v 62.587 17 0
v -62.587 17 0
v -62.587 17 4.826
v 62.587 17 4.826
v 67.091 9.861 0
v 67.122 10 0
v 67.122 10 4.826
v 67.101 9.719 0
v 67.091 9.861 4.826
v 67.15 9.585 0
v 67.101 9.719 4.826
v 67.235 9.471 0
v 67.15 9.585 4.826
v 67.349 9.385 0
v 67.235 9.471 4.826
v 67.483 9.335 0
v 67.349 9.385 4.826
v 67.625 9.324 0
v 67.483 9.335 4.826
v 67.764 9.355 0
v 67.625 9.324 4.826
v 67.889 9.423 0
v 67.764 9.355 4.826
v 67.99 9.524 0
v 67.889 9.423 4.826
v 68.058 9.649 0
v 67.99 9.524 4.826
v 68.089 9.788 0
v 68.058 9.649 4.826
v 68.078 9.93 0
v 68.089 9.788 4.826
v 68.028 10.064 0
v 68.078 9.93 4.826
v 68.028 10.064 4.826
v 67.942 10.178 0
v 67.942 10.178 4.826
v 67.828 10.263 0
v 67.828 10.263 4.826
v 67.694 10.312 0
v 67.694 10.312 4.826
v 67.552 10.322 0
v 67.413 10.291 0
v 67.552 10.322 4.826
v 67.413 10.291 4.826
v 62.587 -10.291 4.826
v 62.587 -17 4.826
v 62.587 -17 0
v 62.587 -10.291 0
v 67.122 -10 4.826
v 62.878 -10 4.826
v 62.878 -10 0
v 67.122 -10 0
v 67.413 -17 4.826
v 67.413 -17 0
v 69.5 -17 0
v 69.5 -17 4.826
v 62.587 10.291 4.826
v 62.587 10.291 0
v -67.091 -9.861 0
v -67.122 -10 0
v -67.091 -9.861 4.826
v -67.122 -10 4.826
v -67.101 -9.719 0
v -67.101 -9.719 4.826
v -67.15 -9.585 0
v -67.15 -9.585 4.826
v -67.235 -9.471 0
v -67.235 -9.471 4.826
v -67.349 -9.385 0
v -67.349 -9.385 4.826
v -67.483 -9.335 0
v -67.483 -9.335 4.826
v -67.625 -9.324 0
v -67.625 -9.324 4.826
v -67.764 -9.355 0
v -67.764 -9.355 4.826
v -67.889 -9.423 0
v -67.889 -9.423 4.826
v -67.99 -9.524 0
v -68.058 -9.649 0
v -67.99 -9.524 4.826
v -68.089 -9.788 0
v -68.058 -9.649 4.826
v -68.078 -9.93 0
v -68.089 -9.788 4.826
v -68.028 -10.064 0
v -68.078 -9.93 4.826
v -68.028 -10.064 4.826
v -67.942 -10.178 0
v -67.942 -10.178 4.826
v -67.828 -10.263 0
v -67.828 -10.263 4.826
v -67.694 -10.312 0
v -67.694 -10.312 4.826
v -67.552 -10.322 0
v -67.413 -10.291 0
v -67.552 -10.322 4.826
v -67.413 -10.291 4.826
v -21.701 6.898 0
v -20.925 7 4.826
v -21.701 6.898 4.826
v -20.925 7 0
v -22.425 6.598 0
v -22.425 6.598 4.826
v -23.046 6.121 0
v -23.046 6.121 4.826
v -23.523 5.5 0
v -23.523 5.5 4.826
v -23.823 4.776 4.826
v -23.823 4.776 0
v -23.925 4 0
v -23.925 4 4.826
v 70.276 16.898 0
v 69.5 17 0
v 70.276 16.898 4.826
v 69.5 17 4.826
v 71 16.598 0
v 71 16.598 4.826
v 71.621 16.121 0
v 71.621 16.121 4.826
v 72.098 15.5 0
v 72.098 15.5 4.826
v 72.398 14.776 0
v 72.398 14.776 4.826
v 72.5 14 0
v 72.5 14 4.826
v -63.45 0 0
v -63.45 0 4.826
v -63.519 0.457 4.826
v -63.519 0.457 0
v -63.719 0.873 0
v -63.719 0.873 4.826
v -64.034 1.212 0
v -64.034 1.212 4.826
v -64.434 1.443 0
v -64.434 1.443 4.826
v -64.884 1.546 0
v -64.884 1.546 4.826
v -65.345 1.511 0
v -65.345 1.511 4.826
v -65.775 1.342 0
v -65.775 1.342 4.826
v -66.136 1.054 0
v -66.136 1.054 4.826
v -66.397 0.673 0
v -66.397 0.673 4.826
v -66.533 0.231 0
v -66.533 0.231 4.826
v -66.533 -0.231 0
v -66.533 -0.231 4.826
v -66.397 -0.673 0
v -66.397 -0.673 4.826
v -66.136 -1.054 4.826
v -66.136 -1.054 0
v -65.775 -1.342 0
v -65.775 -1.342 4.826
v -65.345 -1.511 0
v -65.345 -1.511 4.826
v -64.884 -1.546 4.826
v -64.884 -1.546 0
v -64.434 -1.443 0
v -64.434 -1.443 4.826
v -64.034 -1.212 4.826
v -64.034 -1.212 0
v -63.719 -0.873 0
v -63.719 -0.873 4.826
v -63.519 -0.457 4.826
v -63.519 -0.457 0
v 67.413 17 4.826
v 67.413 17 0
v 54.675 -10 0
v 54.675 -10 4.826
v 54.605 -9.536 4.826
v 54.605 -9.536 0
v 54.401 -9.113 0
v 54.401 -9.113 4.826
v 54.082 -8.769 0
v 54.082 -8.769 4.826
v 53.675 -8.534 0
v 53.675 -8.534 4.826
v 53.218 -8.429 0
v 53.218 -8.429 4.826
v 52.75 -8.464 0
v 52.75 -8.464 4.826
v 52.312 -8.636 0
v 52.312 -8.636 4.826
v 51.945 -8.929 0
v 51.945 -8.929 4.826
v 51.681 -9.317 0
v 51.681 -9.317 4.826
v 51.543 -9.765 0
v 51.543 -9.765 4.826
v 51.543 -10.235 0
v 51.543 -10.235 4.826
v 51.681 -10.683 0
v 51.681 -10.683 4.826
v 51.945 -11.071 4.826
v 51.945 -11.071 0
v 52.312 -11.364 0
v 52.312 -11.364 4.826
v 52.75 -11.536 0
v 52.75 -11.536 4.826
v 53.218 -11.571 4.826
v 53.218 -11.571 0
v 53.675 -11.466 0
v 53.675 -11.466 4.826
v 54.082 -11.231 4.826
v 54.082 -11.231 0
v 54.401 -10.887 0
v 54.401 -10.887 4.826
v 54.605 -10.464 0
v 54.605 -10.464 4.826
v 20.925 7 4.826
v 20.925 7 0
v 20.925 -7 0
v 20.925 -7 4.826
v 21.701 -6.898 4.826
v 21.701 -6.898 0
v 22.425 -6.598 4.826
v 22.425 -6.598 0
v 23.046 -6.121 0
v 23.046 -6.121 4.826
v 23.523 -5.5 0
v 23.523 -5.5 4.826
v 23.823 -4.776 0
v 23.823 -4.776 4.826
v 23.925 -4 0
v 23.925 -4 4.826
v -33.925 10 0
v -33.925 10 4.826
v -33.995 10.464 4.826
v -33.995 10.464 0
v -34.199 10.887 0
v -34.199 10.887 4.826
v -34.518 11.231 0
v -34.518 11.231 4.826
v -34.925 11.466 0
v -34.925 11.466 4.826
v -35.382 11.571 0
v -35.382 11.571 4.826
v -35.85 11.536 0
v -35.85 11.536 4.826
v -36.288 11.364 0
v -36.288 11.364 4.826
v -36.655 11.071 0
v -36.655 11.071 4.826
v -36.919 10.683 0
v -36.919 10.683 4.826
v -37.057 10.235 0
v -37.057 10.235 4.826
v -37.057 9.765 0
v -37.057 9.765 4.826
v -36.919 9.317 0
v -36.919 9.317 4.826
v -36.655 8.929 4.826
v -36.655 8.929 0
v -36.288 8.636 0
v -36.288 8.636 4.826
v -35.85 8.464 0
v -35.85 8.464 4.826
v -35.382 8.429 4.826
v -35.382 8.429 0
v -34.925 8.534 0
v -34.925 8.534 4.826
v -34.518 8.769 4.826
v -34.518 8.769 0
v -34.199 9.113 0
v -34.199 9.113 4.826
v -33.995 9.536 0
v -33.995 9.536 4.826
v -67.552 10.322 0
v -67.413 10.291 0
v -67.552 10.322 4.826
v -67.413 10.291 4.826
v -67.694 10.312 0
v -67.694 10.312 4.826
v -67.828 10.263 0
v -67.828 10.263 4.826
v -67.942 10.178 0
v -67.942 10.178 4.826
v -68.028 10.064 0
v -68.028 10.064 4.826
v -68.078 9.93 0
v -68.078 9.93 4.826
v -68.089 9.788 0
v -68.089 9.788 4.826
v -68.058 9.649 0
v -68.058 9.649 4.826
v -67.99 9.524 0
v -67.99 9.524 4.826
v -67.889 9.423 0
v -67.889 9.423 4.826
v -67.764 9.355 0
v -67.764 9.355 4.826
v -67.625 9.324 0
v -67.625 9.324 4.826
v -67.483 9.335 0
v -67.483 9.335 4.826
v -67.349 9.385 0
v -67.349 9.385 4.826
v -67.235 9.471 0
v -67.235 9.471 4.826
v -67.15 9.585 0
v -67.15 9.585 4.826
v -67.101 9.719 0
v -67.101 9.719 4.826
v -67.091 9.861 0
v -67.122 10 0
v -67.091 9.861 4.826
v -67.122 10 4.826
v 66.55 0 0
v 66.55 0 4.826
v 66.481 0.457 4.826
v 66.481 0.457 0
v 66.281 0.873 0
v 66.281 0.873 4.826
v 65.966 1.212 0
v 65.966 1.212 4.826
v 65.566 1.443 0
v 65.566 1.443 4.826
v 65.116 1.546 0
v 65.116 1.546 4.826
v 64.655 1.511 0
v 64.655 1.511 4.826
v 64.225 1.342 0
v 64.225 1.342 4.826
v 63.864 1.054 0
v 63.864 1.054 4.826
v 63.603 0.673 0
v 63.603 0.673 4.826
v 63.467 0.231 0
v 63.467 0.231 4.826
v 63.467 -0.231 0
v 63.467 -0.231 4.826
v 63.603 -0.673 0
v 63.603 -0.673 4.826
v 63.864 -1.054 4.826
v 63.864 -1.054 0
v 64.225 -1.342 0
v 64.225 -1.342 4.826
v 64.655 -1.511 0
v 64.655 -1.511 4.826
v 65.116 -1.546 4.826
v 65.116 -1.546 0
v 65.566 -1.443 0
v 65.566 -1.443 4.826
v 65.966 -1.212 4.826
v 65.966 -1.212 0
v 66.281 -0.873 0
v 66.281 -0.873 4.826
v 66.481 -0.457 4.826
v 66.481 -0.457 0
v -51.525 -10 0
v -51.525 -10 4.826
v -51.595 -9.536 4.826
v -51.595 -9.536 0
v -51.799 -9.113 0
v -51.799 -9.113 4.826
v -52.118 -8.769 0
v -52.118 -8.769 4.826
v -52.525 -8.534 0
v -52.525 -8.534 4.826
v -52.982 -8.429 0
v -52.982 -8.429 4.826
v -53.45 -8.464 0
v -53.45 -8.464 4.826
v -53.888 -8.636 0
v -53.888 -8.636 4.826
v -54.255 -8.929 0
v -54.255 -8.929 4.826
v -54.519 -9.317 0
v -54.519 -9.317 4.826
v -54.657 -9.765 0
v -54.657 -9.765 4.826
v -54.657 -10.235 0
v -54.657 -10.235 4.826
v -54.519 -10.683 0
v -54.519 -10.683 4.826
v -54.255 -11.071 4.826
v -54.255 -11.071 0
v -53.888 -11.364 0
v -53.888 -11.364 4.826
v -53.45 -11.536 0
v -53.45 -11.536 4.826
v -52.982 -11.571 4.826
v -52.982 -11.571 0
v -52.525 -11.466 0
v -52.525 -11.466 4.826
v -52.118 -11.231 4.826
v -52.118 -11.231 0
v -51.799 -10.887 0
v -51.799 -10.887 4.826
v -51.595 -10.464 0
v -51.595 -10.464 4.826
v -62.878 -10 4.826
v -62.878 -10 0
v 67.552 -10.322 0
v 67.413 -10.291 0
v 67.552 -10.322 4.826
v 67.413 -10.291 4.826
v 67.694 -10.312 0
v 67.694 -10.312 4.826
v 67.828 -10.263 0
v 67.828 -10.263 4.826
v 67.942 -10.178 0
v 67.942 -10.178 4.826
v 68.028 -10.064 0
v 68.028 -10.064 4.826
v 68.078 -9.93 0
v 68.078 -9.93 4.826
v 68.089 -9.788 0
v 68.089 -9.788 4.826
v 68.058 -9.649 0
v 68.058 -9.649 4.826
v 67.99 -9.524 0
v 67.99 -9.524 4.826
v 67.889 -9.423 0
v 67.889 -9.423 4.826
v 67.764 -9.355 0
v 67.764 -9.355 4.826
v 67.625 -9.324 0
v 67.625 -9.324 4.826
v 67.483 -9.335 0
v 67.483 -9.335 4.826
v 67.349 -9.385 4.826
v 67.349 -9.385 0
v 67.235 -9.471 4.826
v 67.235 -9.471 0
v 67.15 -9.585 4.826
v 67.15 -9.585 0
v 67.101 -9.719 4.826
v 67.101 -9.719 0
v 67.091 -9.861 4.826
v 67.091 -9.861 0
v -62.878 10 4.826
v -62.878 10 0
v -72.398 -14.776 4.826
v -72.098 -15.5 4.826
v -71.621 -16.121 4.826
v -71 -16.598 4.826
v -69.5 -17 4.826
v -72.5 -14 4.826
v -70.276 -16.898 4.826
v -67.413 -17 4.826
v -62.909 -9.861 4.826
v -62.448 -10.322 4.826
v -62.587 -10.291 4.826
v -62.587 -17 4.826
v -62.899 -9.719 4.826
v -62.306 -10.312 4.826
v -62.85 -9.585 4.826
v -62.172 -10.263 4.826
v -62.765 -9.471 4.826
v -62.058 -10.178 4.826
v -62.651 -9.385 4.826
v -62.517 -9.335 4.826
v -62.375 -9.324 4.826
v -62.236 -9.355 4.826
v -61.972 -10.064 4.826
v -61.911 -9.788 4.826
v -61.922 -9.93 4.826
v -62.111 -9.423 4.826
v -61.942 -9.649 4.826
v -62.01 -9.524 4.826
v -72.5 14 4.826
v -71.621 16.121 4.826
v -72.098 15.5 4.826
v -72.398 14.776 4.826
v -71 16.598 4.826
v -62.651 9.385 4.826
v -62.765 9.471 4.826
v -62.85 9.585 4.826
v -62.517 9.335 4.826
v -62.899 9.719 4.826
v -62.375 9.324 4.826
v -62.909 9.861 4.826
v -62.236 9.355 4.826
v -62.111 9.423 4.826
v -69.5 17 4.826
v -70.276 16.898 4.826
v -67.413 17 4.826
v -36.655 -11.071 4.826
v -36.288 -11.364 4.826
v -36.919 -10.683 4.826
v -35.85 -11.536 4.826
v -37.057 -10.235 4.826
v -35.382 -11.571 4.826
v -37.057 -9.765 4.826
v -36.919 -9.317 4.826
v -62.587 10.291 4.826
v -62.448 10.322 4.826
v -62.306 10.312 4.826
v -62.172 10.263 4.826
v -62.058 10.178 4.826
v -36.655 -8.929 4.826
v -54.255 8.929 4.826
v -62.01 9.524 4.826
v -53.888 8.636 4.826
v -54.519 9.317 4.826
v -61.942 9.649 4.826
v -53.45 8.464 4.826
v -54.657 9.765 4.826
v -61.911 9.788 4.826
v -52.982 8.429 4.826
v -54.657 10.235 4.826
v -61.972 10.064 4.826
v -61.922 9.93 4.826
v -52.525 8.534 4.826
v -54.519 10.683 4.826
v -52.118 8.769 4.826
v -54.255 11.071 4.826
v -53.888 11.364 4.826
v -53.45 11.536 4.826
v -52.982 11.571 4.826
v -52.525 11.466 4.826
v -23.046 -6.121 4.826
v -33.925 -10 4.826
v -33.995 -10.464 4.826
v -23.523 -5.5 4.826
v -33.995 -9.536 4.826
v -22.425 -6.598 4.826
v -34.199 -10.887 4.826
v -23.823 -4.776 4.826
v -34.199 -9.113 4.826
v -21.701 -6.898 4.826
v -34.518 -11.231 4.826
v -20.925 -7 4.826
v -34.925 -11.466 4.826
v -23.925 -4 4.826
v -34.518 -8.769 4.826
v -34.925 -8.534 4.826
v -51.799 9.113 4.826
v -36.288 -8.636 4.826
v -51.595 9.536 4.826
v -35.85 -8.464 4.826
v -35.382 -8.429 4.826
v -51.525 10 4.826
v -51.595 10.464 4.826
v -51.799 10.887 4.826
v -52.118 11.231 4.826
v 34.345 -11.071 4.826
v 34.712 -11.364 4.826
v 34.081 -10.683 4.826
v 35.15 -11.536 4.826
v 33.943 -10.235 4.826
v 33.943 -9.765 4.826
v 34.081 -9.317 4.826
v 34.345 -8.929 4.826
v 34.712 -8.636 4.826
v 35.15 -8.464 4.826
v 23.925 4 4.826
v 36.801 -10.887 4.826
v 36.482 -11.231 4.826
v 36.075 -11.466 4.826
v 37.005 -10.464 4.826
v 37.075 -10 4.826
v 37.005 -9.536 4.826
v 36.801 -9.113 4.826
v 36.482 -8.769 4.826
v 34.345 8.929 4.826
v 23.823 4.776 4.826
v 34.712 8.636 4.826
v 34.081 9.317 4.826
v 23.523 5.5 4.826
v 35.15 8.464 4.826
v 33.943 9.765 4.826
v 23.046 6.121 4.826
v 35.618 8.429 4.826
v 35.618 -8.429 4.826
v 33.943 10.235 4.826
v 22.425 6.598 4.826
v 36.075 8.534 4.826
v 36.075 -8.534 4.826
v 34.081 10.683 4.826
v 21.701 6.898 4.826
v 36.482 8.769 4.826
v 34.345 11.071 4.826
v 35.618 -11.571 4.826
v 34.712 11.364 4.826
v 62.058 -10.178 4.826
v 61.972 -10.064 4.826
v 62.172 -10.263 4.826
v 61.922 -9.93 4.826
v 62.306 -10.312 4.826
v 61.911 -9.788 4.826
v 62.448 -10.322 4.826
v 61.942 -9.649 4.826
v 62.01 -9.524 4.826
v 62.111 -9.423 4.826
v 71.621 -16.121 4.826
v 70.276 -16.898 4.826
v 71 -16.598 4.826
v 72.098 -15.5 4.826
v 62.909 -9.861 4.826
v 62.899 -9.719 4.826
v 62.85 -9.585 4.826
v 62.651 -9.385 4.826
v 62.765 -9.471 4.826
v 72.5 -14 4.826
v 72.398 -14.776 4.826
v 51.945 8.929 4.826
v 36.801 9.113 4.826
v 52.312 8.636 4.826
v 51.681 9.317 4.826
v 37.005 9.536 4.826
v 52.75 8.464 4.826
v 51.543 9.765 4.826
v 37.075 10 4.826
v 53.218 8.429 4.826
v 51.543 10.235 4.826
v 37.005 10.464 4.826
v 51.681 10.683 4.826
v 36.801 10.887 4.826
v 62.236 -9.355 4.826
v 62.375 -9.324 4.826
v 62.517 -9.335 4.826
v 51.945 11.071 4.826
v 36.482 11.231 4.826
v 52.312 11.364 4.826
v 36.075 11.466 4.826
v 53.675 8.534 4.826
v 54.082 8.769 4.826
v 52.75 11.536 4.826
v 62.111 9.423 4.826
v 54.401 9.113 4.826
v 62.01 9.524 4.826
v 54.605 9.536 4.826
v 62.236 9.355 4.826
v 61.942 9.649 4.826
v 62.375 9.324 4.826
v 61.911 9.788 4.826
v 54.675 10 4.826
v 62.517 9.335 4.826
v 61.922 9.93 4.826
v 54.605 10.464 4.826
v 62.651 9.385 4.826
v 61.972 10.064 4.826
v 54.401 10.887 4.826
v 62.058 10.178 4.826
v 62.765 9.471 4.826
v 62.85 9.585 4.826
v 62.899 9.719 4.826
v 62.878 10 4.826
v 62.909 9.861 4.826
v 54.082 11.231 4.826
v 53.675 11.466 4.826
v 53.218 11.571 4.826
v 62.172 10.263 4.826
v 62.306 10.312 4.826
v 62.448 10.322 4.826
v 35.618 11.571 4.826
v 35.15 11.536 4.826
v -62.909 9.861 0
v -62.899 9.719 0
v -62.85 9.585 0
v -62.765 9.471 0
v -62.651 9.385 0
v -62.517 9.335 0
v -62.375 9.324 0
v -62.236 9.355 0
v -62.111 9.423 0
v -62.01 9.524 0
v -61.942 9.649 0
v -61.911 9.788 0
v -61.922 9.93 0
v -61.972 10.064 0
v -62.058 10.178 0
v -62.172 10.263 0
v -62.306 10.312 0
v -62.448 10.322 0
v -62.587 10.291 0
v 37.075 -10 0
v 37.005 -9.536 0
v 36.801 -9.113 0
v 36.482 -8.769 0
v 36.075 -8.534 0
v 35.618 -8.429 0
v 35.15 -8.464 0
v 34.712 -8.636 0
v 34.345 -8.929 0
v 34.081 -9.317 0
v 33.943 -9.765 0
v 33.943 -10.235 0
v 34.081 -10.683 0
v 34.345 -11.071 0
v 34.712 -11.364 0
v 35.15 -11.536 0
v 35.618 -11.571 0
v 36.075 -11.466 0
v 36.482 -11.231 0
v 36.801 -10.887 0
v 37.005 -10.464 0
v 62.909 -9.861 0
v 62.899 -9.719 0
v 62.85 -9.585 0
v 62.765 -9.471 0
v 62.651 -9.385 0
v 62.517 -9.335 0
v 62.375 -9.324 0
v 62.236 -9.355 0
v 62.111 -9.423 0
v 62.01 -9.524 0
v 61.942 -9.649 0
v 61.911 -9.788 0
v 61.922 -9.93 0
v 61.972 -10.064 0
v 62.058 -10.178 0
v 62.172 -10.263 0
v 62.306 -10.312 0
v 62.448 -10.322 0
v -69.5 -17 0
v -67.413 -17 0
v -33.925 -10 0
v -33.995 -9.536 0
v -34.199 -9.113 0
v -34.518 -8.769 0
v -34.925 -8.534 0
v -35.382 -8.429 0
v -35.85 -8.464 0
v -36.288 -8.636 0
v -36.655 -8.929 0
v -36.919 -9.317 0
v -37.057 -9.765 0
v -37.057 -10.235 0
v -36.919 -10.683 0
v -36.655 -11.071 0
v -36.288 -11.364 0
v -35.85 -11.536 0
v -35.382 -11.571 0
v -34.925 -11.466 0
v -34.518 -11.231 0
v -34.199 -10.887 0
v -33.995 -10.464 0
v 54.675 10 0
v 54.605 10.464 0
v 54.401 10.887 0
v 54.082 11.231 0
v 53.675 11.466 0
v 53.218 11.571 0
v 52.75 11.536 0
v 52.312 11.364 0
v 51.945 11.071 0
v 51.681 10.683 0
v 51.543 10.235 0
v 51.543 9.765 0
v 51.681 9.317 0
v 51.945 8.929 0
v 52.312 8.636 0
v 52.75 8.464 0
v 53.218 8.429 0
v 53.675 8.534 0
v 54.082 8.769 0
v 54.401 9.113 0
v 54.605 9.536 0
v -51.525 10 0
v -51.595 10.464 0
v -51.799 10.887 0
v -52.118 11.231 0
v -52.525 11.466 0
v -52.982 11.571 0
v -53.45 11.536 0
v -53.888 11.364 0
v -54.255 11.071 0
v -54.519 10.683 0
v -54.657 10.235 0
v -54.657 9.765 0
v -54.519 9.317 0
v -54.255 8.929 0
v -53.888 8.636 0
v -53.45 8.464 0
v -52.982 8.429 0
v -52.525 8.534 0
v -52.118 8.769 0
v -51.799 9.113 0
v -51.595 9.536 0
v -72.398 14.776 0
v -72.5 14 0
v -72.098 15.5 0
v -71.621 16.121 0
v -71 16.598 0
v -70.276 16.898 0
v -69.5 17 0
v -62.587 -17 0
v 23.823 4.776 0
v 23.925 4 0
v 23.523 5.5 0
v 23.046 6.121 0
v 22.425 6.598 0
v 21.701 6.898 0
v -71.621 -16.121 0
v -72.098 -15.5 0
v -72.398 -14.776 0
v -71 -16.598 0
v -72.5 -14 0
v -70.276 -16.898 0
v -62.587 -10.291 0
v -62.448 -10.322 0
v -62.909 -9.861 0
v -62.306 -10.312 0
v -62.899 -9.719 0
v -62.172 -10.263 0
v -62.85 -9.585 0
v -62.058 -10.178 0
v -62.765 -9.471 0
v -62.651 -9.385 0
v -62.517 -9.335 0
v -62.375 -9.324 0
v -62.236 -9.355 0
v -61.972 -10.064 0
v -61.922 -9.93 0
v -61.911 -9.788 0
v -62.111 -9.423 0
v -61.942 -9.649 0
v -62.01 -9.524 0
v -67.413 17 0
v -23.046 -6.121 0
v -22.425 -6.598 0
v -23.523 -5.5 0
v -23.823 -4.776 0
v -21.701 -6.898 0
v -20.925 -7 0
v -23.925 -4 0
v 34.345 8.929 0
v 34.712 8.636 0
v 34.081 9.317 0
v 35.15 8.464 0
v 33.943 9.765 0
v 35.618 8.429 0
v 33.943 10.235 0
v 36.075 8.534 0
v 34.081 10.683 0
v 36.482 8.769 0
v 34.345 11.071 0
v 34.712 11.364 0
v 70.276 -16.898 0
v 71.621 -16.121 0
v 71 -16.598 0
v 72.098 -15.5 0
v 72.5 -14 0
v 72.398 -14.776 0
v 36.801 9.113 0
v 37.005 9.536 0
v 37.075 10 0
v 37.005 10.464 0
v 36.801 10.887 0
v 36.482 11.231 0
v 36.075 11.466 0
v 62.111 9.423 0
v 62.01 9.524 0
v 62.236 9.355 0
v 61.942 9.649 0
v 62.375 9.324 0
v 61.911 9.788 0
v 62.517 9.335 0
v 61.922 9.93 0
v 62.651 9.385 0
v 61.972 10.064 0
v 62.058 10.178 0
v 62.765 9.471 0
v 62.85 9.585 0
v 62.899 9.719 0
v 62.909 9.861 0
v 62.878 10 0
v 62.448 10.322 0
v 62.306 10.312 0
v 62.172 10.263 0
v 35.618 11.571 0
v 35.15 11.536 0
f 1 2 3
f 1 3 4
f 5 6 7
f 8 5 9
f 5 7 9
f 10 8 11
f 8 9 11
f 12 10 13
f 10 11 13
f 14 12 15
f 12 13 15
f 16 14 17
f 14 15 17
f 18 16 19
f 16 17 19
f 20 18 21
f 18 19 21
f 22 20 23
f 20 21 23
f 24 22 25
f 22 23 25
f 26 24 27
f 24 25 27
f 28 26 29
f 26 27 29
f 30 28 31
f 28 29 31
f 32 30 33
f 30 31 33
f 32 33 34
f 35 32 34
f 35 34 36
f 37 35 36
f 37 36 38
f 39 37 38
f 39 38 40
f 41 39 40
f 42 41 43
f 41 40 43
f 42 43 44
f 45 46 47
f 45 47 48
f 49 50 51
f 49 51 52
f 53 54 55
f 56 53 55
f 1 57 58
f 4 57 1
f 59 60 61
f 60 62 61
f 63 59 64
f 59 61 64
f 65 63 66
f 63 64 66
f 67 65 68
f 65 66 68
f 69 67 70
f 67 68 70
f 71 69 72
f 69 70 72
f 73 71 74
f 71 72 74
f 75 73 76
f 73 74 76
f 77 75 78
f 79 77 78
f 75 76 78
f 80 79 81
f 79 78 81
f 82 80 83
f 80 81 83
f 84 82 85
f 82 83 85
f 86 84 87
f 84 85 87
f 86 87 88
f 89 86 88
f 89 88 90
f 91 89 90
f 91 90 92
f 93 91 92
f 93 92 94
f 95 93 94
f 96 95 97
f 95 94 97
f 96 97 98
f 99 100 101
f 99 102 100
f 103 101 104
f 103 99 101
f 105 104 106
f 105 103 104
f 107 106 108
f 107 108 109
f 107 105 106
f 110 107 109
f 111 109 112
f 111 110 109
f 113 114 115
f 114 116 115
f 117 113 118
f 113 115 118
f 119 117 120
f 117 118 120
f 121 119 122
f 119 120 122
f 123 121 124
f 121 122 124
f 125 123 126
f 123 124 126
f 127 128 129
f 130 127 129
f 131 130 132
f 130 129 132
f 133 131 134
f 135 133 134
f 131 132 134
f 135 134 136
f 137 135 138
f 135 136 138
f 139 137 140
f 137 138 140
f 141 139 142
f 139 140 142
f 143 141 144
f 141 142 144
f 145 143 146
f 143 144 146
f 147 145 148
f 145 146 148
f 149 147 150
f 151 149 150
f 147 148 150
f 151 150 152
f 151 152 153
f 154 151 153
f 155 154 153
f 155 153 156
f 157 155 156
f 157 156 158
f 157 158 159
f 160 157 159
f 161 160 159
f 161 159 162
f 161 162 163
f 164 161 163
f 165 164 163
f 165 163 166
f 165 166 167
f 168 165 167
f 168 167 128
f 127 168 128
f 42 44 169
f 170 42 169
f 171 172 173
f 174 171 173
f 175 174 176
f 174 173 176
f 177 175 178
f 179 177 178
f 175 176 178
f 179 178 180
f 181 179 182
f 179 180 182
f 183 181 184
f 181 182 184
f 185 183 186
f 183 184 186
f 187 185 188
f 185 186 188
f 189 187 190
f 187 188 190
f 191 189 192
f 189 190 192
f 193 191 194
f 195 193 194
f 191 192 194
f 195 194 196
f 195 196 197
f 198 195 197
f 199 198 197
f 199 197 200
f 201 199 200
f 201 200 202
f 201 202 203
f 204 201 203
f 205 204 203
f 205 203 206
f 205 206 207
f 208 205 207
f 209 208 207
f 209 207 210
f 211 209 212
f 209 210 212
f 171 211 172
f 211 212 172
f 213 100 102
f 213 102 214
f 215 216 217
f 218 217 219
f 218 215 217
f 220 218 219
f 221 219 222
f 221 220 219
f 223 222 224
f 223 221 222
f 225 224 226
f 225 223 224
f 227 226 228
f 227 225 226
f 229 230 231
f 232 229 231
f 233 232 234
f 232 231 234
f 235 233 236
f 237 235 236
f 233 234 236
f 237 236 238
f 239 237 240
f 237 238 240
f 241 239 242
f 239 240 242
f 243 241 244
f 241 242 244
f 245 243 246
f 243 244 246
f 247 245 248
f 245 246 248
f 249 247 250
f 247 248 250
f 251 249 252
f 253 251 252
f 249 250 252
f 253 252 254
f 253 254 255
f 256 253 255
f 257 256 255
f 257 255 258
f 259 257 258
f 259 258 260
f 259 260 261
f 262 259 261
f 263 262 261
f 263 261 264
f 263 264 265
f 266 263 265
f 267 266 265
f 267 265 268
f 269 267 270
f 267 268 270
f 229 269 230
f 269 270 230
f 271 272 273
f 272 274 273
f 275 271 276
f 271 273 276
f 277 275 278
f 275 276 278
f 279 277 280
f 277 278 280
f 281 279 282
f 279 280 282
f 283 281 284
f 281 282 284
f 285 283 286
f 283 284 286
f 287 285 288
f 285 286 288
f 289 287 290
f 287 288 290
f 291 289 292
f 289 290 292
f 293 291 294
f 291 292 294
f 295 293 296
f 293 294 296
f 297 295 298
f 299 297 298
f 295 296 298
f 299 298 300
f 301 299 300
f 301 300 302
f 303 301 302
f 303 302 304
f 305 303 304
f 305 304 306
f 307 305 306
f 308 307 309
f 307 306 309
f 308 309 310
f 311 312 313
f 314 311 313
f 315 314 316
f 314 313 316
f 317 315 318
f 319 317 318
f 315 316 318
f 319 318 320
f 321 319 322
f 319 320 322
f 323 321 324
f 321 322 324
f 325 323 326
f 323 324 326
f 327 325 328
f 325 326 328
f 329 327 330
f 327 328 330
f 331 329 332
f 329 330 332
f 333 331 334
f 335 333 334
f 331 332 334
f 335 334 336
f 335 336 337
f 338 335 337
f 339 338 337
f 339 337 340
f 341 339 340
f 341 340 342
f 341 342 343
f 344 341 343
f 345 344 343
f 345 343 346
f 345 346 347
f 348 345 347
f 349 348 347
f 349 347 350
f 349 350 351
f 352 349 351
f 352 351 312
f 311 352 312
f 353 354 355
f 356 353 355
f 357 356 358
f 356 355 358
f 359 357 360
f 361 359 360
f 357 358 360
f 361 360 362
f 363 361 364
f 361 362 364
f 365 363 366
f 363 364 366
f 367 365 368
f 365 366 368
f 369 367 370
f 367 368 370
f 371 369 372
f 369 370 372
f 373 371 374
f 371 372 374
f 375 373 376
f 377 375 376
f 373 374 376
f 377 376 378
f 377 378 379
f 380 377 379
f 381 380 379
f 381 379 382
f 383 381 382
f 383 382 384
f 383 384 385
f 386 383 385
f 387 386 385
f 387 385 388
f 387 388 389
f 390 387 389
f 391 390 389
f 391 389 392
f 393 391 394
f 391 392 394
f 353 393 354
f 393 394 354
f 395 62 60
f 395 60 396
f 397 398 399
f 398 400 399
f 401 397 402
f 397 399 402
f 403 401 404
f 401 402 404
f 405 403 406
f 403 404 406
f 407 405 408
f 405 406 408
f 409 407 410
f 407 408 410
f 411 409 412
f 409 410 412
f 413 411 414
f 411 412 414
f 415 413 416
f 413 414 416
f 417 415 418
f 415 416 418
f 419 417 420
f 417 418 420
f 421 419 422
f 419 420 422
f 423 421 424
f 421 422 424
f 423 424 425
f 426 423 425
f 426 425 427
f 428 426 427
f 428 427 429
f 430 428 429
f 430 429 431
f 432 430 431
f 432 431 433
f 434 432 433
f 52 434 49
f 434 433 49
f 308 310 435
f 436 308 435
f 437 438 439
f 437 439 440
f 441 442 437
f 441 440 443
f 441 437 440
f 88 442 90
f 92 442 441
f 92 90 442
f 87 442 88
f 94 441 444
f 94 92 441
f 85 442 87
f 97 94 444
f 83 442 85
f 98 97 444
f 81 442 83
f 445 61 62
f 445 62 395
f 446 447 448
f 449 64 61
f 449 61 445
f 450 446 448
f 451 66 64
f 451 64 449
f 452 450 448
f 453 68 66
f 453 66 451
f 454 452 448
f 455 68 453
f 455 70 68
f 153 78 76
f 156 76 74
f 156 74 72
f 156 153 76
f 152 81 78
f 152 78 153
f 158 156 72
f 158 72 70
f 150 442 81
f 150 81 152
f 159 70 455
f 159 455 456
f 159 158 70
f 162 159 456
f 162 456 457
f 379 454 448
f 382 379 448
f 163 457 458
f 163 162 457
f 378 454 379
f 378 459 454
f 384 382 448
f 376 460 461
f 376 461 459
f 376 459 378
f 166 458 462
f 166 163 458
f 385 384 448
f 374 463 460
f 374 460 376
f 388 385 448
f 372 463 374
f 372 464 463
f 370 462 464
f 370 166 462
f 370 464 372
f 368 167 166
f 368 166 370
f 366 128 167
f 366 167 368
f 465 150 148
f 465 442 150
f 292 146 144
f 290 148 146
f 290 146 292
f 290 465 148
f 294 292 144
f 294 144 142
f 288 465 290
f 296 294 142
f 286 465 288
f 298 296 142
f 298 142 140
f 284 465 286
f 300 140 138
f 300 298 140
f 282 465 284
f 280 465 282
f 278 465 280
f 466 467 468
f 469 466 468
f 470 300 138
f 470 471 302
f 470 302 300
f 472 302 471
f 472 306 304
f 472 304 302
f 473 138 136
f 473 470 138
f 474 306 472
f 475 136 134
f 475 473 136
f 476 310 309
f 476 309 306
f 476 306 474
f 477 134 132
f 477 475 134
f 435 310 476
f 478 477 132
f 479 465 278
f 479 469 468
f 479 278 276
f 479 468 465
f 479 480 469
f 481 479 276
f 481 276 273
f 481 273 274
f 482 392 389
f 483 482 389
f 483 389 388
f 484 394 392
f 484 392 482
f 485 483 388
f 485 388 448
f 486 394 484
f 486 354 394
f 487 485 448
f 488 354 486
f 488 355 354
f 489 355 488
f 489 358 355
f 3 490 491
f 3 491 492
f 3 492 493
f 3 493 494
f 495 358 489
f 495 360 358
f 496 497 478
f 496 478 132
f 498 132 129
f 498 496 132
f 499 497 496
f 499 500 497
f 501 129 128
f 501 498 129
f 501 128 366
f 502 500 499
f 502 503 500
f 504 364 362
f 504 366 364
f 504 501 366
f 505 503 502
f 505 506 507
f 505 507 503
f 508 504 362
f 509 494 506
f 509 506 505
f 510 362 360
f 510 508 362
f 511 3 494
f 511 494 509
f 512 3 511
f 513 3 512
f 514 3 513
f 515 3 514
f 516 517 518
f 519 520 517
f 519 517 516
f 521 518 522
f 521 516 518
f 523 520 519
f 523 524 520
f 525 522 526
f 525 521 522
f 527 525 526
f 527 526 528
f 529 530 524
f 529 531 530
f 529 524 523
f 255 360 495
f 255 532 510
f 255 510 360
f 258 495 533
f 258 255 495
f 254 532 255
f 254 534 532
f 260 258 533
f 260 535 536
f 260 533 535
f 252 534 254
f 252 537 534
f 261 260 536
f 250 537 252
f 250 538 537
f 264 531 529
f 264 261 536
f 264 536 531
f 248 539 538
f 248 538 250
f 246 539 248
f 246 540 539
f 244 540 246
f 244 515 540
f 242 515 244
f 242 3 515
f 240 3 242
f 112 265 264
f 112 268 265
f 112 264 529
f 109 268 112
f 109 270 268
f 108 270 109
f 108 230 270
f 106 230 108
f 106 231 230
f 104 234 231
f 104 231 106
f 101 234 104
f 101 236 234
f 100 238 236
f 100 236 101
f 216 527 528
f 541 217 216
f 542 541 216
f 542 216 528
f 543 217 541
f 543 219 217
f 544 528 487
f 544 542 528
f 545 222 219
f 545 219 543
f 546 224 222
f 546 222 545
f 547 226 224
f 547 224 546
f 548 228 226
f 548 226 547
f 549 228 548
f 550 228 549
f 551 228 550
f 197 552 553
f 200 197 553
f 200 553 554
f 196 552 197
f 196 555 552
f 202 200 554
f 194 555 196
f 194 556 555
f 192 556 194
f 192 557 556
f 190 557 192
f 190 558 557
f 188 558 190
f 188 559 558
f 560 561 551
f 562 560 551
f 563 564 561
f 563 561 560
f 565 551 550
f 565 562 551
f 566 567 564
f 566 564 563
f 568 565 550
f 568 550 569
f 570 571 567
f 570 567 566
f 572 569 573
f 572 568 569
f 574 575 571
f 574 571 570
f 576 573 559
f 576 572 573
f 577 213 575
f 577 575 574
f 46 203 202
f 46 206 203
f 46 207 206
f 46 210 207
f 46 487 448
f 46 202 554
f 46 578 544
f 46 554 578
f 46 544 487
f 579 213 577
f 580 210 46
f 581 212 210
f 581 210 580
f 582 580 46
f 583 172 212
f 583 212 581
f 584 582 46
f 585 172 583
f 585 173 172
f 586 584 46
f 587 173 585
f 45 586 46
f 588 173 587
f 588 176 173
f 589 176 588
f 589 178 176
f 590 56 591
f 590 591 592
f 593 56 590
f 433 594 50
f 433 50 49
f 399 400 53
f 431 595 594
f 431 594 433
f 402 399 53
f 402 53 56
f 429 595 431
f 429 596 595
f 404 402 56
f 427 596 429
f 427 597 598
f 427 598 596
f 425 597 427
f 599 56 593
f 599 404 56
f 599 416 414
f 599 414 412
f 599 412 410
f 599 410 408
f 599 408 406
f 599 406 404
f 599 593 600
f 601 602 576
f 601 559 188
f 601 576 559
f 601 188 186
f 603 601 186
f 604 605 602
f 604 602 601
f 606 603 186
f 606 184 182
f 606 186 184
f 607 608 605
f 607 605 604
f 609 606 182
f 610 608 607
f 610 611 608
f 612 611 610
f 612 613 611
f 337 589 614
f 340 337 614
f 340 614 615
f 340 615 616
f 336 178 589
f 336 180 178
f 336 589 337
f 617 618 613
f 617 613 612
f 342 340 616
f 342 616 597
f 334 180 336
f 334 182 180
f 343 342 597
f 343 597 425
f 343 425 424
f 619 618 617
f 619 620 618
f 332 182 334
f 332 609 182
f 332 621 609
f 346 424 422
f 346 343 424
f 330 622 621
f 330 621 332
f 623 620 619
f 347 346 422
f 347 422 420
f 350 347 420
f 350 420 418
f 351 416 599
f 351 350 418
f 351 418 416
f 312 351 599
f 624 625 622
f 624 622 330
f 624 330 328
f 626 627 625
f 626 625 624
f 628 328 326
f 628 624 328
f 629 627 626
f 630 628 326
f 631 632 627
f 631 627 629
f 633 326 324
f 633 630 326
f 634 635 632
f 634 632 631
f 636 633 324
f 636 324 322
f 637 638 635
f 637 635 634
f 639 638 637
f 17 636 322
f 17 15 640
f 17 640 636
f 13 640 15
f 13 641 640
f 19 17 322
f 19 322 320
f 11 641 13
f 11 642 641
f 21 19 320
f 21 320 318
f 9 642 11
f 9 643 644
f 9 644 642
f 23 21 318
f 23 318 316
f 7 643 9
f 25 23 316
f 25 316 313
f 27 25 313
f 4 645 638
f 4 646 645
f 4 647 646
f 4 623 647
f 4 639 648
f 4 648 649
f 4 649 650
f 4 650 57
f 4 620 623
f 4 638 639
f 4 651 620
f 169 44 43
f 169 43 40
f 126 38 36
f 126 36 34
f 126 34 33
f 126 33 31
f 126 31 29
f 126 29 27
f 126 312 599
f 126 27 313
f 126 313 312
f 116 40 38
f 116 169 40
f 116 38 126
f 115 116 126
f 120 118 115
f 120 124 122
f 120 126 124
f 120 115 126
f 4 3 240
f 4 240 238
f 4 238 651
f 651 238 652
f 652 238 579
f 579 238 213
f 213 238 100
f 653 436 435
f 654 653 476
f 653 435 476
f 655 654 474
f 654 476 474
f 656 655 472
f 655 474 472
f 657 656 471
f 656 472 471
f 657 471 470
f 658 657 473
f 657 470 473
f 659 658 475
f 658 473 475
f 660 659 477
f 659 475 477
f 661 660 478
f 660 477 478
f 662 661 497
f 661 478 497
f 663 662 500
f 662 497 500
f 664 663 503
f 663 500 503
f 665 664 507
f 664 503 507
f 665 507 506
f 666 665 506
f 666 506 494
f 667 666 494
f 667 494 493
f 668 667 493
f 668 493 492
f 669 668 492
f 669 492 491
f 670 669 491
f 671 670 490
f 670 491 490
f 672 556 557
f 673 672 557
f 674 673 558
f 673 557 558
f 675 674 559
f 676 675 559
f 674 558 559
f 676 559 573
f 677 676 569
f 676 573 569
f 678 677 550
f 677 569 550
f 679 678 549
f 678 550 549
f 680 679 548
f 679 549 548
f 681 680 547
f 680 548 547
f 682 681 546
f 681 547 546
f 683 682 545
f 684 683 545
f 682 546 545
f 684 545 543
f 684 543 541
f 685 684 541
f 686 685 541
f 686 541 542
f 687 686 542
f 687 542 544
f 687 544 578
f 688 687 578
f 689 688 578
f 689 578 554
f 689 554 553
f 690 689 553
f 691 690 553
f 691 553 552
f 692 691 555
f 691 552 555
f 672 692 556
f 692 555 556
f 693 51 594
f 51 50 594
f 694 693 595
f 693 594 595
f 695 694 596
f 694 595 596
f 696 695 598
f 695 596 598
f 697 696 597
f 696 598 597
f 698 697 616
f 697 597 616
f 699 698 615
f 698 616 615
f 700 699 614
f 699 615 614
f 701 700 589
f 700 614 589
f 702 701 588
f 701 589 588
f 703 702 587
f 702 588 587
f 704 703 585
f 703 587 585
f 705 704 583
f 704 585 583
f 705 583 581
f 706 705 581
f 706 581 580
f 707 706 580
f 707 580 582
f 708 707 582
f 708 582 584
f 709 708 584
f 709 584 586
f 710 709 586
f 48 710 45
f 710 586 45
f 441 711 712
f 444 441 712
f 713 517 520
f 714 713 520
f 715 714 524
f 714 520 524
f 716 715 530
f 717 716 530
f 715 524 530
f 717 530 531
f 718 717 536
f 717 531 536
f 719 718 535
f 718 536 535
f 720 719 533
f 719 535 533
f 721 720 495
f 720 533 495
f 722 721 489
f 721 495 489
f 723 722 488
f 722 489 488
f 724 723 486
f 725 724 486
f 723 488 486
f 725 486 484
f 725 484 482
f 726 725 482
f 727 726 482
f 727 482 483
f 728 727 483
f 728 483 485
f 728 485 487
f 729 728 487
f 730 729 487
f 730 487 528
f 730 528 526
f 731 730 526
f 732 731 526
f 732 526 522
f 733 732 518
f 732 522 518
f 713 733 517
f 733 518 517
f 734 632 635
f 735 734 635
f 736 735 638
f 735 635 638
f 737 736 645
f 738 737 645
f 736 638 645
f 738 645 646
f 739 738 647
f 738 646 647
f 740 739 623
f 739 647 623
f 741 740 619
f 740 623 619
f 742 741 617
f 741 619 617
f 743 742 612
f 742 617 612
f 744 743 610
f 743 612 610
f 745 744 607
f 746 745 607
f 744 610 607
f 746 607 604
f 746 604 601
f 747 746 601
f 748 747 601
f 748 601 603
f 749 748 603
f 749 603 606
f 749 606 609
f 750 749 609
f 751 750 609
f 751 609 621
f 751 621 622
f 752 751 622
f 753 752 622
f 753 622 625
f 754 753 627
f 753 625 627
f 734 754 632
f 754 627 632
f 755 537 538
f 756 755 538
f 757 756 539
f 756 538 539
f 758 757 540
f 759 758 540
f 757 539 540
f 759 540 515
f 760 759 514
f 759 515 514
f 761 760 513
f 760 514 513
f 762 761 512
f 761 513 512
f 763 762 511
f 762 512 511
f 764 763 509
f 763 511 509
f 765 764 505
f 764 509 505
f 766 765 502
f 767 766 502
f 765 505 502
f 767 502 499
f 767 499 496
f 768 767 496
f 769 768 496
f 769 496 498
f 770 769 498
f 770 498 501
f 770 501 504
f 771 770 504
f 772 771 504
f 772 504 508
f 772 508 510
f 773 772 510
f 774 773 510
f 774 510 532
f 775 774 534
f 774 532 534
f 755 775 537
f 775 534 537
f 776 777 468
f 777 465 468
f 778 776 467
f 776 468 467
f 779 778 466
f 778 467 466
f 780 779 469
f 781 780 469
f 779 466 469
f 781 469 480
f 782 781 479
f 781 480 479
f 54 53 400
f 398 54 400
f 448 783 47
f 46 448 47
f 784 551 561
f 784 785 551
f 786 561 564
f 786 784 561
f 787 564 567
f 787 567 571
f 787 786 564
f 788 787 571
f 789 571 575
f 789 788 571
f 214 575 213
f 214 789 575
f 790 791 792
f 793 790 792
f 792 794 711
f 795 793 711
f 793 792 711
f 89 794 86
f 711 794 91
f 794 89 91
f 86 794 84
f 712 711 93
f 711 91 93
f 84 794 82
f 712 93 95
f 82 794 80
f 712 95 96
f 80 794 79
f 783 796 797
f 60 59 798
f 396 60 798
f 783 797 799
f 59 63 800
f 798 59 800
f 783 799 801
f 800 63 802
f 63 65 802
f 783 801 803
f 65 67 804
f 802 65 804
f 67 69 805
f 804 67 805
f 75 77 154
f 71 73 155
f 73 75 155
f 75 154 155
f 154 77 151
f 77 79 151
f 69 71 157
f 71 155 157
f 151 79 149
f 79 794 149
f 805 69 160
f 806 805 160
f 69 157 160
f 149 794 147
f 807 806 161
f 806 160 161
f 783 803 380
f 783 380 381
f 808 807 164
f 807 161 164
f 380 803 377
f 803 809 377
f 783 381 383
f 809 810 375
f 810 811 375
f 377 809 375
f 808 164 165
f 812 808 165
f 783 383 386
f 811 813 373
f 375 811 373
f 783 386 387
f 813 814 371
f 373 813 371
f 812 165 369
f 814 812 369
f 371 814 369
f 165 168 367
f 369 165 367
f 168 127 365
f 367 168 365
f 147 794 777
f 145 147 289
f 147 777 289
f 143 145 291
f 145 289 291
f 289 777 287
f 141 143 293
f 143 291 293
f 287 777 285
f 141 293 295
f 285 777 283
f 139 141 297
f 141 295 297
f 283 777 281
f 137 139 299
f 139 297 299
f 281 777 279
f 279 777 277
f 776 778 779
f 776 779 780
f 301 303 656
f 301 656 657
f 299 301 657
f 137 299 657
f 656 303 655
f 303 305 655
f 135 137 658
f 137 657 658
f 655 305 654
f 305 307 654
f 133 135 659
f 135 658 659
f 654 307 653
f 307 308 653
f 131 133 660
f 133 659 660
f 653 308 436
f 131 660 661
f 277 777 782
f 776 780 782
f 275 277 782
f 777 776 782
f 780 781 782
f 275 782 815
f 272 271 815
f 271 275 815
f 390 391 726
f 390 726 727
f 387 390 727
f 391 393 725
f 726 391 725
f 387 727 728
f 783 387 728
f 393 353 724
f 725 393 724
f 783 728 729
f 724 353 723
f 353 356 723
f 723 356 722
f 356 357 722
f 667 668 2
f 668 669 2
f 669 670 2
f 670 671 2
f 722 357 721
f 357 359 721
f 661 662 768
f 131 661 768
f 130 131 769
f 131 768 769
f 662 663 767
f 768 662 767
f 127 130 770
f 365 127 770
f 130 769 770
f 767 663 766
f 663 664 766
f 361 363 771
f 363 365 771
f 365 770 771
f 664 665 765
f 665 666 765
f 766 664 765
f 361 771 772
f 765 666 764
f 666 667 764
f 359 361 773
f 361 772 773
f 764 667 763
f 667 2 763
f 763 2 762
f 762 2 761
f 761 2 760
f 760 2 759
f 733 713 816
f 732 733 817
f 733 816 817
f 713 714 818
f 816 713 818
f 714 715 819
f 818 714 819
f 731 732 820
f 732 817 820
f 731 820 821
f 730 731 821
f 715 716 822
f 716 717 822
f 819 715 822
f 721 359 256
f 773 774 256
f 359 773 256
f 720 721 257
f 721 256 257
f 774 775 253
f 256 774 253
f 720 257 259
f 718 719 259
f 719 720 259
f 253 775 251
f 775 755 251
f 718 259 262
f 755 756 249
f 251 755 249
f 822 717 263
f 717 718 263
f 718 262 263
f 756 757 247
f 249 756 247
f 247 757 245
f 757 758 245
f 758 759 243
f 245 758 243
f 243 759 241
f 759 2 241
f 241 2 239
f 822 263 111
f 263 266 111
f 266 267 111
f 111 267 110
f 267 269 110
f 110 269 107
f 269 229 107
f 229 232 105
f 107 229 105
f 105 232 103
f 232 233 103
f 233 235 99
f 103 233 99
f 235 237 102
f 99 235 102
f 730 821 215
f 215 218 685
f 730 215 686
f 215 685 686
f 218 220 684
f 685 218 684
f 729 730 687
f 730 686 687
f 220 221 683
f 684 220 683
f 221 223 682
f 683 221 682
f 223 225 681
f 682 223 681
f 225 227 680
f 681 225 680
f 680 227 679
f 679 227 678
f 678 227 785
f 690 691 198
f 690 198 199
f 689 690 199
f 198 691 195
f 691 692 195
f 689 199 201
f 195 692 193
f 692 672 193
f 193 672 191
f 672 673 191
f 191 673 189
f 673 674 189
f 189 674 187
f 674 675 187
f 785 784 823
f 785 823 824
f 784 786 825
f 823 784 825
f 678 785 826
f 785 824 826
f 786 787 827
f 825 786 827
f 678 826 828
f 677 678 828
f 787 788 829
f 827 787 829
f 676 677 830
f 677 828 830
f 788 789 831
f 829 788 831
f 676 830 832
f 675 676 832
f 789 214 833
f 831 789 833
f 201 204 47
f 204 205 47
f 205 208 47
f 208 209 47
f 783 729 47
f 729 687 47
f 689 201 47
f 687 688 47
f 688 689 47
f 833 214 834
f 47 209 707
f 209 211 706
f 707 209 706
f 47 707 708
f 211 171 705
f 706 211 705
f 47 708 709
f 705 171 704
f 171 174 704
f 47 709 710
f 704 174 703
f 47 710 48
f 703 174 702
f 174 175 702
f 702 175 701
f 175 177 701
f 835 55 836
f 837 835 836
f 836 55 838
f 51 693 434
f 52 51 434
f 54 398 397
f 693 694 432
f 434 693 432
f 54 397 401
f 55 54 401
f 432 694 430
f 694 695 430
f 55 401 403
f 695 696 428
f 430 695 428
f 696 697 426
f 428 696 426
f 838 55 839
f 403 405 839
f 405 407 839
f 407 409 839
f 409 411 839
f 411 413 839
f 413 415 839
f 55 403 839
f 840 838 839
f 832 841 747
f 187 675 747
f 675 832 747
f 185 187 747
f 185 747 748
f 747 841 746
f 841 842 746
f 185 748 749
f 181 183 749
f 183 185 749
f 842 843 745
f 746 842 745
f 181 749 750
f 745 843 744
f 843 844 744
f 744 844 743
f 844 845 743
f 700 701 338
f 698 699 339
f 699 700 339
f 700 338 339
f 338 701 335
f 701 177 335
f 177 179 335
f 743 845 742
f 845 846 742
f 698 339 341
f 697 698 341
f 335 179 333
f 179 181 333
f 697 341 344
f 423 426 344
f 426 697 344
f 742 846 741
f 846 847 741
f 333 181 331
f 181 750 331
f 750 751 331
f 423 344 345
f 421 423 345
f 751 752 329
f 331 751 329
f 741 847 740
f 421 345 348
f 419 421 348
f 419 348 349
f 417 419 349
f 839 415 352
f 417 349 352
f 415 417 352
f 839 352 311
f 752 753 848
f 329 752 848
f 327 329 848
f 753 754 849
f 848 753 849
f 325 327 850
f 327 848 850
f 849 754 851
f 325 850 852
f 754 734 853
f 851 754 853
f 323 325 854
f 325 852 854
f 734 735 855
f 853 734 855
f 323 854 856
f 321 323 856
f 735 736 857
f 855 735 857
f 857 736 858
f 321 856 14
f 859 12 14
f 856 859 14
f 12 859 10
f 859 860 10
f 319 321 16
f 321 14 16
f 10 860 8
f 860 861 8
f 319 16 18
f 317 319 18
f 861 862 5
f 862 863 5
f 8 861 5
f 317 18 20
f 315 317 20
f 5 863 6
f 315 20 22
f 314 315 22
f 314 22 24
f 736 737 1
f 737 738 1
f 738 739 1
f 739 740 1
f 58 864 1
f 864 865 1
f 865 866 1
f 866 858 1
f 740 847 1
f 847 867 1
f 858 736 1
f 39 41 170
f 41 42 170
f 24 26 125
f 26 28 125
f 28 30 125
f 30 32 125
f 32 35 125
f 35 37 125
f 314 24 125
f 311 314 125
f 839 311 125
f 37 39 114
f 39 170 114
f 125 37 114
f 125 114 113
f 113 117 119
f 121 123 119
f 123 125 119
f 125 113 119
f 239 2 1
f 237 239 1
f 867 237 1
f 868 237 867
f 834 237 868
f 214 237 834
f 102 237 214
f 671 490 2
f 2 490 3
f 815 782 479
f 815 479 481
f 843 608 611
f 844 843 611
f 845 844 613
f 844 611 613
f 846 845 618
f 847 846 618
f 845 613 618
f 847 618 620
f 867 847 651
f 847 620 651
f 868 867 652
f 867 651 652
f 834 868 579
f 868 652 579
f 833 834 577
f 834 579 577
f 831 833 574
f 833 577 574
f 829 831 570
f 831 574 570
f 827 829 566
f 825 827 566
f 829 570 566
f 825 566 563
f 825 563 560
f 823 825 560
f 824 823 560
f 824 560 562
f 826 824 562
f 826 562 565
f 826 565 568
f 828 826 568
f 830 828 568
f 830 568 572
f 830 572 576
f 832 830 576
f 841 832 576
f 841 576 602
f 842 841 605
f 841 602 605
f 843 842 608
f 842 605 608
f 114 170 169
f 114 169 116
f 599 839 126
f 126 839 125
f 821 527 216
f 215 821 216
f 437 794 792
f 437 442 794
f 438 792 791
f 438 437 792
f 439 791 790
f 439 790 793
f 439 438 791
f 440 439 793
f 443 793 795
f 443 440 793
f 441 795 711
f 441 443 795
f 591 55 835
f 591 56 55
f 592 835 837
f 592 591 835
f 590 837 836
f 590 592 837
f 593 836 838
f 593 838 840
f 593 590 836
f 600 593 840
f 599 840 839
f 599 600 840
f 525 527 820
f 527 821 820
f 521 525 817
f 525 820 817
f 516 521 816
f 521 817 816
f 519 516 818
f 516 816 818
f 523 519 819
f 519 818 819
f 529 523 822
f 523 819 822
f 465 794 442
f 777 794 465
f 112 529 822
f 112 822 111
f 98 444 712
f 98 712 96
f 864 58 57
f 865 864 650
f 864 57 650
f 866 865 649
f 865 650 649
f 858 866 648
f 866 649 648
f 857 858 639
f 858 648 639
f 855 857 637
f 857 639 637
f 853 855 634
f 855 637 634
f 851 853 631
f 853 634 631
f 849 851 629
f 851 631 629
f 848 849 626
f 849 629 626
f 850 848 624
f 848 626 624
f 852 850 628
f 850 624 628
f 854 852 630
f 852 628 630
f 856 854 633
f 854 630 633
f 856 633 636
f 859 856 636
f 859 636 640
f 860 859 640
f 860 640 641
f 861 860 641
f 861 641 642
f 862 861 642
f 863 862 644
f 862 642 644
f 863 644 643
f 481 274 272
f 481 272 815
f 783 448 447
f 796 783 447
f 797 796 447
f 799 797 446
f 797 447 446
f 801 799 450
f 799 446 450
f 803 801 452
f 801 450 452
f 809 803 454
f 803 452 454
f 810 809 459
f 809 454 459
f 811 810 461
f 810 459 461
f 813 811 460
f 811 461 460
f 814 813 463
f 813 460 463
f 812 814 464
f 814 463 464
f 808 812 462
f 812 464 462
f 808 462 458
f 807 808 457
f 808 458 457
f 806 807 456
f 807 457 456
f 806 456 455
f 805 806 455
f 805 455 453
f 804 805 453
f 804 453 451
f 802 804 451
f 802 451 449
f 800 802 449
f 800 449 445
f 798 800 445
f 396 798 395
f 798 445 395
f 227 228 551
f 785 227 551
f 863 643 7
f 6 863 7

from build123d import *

# Parameters (mm, degrees)
F0_W      = 145
F0_H      = 34
F1_DEPTH  = 4.826
F2_R      = 1.575
F3_DEPTH  = 4.826
F4_R      = 3
F5_W      = 4.826
F5_H      = 7
F5_R      = 1.55
F6_DEPTH  = 4.827
F7_R      = 0.5
F8_DEPTH  = 4.827
F9_W      = 47.85
F9_H      = 14
F10_DEPTH = 4.827
F11_R     = 3


with BuildPart() as f1:
    # F0 (on Top) → F1 (new body)
    with BuildSketch(Plane.XY):
        Rectangle(F0_W, F0_H)
    extrude(amount=F1_DEPTH)

    # F2 (on face) → F3 (cut, through all)
    with BuildSketch(Plane.XY.offset(4.826)):
        with Locations((-53.1, -10)):
            Circle(F2_R)
        with Locations((-35.5, -10)):
            Circle(F2_R)
        with Locations((53.1, -10)):
            Circle(F2_R)
        with Locations((35.5, -10)):
            Circle(F2_R)
        with Locations((-35.5, 10)):
            Circle(F2_R)
        with Locations((-53.1, 10)):
            Circle(F2_R)
        with Locations((35.5, 10)):
            Circle(F2_R)
        with Locations((53.1, 10)):
            Circle(F2_R)
    extrude(amount=-F3_DEPTH, mode=Mode.SUBTRACT)

    # F4
    f4_edges = [f1.edges().sort_by_distance(p)[0] for p in [
        (-72.5, -17, 2.413),
        (-72.5, 17, 2.413),
        (72.5, -17, 2.413),
        (72.5, 17, 2.413),
    ]]
    fillet(f4_edges, radius=F4_R)

    # F5 (on face) → F6 (cut, through all)
    with BuildSketch(Plane.XY.offset(4.826)):
        with Locations((-65, 13.5)):
            Rectangle(F5_W, F5_H)
        with Locations((-65, -13.5)):
            Rectangle(F5_W, F5_H)
        with Locations((-65, 0)):
            Circle(F5_R)
        with Locations((65, -13.5)):
            Rectangle(F5_W, F5_H)
        with Locations((65, 13.5)):
            Rectangle(F5_W, F5_H)
        with Locations((65, 0)):
            Circle(F5_R)
    extrude(amount=-F6_DEPTH, mode=Mode.SUBTRACT)

    # F7 (on face) → F8 (cut, through all)
    with BuildSketch(Plane.XY.offset(4.826)):
        with Locations((-67.589777, 9.823223)):
            Circle(F7_R)
        with Locations((-62.410223, 9.823223)):
            Circle(F7_R)
        with Locations((-67.589777, -9.823223)):
            Circle(F7_R)
        with Locations((-62.410223, -9.823223)):
            Circle(F7_R)
        with Locations((67.589777, 9.823223)):
            Circle(F7_R)
        with Locations((62.410223, 9.823223)):
            Circle(F7_R)
        with Locations((62.410223, -9.823223)):
            Circle(F7_R)
        with Locations((67.589777, -9.823223)):
            Circle(F7_R)
    extrude(amount=-F8_DEPTH, mode=Mode.SUBTRACT)

    # F9 (on face) → F10 (cut, through all)
    with BuildSketch(Plane.XY.offset(4.826)):
        Rectangle(F9_W, F9_H)
    extrude(amount=-F10_DEPTH, mode=Mode.SUBTRACT)

    # F11
    f11_edges = [f1.edges().sort_by_distance(p)[0] for p in [
        (-23.925, 7, 2.413),
        (-23.925, -7, 2.413),
        (23.925, 7, 2.413),
        (23.925, -7, 2.413),
    ]]
    fillet(f11_edges, radius=F11_R)


solid = f1.part
